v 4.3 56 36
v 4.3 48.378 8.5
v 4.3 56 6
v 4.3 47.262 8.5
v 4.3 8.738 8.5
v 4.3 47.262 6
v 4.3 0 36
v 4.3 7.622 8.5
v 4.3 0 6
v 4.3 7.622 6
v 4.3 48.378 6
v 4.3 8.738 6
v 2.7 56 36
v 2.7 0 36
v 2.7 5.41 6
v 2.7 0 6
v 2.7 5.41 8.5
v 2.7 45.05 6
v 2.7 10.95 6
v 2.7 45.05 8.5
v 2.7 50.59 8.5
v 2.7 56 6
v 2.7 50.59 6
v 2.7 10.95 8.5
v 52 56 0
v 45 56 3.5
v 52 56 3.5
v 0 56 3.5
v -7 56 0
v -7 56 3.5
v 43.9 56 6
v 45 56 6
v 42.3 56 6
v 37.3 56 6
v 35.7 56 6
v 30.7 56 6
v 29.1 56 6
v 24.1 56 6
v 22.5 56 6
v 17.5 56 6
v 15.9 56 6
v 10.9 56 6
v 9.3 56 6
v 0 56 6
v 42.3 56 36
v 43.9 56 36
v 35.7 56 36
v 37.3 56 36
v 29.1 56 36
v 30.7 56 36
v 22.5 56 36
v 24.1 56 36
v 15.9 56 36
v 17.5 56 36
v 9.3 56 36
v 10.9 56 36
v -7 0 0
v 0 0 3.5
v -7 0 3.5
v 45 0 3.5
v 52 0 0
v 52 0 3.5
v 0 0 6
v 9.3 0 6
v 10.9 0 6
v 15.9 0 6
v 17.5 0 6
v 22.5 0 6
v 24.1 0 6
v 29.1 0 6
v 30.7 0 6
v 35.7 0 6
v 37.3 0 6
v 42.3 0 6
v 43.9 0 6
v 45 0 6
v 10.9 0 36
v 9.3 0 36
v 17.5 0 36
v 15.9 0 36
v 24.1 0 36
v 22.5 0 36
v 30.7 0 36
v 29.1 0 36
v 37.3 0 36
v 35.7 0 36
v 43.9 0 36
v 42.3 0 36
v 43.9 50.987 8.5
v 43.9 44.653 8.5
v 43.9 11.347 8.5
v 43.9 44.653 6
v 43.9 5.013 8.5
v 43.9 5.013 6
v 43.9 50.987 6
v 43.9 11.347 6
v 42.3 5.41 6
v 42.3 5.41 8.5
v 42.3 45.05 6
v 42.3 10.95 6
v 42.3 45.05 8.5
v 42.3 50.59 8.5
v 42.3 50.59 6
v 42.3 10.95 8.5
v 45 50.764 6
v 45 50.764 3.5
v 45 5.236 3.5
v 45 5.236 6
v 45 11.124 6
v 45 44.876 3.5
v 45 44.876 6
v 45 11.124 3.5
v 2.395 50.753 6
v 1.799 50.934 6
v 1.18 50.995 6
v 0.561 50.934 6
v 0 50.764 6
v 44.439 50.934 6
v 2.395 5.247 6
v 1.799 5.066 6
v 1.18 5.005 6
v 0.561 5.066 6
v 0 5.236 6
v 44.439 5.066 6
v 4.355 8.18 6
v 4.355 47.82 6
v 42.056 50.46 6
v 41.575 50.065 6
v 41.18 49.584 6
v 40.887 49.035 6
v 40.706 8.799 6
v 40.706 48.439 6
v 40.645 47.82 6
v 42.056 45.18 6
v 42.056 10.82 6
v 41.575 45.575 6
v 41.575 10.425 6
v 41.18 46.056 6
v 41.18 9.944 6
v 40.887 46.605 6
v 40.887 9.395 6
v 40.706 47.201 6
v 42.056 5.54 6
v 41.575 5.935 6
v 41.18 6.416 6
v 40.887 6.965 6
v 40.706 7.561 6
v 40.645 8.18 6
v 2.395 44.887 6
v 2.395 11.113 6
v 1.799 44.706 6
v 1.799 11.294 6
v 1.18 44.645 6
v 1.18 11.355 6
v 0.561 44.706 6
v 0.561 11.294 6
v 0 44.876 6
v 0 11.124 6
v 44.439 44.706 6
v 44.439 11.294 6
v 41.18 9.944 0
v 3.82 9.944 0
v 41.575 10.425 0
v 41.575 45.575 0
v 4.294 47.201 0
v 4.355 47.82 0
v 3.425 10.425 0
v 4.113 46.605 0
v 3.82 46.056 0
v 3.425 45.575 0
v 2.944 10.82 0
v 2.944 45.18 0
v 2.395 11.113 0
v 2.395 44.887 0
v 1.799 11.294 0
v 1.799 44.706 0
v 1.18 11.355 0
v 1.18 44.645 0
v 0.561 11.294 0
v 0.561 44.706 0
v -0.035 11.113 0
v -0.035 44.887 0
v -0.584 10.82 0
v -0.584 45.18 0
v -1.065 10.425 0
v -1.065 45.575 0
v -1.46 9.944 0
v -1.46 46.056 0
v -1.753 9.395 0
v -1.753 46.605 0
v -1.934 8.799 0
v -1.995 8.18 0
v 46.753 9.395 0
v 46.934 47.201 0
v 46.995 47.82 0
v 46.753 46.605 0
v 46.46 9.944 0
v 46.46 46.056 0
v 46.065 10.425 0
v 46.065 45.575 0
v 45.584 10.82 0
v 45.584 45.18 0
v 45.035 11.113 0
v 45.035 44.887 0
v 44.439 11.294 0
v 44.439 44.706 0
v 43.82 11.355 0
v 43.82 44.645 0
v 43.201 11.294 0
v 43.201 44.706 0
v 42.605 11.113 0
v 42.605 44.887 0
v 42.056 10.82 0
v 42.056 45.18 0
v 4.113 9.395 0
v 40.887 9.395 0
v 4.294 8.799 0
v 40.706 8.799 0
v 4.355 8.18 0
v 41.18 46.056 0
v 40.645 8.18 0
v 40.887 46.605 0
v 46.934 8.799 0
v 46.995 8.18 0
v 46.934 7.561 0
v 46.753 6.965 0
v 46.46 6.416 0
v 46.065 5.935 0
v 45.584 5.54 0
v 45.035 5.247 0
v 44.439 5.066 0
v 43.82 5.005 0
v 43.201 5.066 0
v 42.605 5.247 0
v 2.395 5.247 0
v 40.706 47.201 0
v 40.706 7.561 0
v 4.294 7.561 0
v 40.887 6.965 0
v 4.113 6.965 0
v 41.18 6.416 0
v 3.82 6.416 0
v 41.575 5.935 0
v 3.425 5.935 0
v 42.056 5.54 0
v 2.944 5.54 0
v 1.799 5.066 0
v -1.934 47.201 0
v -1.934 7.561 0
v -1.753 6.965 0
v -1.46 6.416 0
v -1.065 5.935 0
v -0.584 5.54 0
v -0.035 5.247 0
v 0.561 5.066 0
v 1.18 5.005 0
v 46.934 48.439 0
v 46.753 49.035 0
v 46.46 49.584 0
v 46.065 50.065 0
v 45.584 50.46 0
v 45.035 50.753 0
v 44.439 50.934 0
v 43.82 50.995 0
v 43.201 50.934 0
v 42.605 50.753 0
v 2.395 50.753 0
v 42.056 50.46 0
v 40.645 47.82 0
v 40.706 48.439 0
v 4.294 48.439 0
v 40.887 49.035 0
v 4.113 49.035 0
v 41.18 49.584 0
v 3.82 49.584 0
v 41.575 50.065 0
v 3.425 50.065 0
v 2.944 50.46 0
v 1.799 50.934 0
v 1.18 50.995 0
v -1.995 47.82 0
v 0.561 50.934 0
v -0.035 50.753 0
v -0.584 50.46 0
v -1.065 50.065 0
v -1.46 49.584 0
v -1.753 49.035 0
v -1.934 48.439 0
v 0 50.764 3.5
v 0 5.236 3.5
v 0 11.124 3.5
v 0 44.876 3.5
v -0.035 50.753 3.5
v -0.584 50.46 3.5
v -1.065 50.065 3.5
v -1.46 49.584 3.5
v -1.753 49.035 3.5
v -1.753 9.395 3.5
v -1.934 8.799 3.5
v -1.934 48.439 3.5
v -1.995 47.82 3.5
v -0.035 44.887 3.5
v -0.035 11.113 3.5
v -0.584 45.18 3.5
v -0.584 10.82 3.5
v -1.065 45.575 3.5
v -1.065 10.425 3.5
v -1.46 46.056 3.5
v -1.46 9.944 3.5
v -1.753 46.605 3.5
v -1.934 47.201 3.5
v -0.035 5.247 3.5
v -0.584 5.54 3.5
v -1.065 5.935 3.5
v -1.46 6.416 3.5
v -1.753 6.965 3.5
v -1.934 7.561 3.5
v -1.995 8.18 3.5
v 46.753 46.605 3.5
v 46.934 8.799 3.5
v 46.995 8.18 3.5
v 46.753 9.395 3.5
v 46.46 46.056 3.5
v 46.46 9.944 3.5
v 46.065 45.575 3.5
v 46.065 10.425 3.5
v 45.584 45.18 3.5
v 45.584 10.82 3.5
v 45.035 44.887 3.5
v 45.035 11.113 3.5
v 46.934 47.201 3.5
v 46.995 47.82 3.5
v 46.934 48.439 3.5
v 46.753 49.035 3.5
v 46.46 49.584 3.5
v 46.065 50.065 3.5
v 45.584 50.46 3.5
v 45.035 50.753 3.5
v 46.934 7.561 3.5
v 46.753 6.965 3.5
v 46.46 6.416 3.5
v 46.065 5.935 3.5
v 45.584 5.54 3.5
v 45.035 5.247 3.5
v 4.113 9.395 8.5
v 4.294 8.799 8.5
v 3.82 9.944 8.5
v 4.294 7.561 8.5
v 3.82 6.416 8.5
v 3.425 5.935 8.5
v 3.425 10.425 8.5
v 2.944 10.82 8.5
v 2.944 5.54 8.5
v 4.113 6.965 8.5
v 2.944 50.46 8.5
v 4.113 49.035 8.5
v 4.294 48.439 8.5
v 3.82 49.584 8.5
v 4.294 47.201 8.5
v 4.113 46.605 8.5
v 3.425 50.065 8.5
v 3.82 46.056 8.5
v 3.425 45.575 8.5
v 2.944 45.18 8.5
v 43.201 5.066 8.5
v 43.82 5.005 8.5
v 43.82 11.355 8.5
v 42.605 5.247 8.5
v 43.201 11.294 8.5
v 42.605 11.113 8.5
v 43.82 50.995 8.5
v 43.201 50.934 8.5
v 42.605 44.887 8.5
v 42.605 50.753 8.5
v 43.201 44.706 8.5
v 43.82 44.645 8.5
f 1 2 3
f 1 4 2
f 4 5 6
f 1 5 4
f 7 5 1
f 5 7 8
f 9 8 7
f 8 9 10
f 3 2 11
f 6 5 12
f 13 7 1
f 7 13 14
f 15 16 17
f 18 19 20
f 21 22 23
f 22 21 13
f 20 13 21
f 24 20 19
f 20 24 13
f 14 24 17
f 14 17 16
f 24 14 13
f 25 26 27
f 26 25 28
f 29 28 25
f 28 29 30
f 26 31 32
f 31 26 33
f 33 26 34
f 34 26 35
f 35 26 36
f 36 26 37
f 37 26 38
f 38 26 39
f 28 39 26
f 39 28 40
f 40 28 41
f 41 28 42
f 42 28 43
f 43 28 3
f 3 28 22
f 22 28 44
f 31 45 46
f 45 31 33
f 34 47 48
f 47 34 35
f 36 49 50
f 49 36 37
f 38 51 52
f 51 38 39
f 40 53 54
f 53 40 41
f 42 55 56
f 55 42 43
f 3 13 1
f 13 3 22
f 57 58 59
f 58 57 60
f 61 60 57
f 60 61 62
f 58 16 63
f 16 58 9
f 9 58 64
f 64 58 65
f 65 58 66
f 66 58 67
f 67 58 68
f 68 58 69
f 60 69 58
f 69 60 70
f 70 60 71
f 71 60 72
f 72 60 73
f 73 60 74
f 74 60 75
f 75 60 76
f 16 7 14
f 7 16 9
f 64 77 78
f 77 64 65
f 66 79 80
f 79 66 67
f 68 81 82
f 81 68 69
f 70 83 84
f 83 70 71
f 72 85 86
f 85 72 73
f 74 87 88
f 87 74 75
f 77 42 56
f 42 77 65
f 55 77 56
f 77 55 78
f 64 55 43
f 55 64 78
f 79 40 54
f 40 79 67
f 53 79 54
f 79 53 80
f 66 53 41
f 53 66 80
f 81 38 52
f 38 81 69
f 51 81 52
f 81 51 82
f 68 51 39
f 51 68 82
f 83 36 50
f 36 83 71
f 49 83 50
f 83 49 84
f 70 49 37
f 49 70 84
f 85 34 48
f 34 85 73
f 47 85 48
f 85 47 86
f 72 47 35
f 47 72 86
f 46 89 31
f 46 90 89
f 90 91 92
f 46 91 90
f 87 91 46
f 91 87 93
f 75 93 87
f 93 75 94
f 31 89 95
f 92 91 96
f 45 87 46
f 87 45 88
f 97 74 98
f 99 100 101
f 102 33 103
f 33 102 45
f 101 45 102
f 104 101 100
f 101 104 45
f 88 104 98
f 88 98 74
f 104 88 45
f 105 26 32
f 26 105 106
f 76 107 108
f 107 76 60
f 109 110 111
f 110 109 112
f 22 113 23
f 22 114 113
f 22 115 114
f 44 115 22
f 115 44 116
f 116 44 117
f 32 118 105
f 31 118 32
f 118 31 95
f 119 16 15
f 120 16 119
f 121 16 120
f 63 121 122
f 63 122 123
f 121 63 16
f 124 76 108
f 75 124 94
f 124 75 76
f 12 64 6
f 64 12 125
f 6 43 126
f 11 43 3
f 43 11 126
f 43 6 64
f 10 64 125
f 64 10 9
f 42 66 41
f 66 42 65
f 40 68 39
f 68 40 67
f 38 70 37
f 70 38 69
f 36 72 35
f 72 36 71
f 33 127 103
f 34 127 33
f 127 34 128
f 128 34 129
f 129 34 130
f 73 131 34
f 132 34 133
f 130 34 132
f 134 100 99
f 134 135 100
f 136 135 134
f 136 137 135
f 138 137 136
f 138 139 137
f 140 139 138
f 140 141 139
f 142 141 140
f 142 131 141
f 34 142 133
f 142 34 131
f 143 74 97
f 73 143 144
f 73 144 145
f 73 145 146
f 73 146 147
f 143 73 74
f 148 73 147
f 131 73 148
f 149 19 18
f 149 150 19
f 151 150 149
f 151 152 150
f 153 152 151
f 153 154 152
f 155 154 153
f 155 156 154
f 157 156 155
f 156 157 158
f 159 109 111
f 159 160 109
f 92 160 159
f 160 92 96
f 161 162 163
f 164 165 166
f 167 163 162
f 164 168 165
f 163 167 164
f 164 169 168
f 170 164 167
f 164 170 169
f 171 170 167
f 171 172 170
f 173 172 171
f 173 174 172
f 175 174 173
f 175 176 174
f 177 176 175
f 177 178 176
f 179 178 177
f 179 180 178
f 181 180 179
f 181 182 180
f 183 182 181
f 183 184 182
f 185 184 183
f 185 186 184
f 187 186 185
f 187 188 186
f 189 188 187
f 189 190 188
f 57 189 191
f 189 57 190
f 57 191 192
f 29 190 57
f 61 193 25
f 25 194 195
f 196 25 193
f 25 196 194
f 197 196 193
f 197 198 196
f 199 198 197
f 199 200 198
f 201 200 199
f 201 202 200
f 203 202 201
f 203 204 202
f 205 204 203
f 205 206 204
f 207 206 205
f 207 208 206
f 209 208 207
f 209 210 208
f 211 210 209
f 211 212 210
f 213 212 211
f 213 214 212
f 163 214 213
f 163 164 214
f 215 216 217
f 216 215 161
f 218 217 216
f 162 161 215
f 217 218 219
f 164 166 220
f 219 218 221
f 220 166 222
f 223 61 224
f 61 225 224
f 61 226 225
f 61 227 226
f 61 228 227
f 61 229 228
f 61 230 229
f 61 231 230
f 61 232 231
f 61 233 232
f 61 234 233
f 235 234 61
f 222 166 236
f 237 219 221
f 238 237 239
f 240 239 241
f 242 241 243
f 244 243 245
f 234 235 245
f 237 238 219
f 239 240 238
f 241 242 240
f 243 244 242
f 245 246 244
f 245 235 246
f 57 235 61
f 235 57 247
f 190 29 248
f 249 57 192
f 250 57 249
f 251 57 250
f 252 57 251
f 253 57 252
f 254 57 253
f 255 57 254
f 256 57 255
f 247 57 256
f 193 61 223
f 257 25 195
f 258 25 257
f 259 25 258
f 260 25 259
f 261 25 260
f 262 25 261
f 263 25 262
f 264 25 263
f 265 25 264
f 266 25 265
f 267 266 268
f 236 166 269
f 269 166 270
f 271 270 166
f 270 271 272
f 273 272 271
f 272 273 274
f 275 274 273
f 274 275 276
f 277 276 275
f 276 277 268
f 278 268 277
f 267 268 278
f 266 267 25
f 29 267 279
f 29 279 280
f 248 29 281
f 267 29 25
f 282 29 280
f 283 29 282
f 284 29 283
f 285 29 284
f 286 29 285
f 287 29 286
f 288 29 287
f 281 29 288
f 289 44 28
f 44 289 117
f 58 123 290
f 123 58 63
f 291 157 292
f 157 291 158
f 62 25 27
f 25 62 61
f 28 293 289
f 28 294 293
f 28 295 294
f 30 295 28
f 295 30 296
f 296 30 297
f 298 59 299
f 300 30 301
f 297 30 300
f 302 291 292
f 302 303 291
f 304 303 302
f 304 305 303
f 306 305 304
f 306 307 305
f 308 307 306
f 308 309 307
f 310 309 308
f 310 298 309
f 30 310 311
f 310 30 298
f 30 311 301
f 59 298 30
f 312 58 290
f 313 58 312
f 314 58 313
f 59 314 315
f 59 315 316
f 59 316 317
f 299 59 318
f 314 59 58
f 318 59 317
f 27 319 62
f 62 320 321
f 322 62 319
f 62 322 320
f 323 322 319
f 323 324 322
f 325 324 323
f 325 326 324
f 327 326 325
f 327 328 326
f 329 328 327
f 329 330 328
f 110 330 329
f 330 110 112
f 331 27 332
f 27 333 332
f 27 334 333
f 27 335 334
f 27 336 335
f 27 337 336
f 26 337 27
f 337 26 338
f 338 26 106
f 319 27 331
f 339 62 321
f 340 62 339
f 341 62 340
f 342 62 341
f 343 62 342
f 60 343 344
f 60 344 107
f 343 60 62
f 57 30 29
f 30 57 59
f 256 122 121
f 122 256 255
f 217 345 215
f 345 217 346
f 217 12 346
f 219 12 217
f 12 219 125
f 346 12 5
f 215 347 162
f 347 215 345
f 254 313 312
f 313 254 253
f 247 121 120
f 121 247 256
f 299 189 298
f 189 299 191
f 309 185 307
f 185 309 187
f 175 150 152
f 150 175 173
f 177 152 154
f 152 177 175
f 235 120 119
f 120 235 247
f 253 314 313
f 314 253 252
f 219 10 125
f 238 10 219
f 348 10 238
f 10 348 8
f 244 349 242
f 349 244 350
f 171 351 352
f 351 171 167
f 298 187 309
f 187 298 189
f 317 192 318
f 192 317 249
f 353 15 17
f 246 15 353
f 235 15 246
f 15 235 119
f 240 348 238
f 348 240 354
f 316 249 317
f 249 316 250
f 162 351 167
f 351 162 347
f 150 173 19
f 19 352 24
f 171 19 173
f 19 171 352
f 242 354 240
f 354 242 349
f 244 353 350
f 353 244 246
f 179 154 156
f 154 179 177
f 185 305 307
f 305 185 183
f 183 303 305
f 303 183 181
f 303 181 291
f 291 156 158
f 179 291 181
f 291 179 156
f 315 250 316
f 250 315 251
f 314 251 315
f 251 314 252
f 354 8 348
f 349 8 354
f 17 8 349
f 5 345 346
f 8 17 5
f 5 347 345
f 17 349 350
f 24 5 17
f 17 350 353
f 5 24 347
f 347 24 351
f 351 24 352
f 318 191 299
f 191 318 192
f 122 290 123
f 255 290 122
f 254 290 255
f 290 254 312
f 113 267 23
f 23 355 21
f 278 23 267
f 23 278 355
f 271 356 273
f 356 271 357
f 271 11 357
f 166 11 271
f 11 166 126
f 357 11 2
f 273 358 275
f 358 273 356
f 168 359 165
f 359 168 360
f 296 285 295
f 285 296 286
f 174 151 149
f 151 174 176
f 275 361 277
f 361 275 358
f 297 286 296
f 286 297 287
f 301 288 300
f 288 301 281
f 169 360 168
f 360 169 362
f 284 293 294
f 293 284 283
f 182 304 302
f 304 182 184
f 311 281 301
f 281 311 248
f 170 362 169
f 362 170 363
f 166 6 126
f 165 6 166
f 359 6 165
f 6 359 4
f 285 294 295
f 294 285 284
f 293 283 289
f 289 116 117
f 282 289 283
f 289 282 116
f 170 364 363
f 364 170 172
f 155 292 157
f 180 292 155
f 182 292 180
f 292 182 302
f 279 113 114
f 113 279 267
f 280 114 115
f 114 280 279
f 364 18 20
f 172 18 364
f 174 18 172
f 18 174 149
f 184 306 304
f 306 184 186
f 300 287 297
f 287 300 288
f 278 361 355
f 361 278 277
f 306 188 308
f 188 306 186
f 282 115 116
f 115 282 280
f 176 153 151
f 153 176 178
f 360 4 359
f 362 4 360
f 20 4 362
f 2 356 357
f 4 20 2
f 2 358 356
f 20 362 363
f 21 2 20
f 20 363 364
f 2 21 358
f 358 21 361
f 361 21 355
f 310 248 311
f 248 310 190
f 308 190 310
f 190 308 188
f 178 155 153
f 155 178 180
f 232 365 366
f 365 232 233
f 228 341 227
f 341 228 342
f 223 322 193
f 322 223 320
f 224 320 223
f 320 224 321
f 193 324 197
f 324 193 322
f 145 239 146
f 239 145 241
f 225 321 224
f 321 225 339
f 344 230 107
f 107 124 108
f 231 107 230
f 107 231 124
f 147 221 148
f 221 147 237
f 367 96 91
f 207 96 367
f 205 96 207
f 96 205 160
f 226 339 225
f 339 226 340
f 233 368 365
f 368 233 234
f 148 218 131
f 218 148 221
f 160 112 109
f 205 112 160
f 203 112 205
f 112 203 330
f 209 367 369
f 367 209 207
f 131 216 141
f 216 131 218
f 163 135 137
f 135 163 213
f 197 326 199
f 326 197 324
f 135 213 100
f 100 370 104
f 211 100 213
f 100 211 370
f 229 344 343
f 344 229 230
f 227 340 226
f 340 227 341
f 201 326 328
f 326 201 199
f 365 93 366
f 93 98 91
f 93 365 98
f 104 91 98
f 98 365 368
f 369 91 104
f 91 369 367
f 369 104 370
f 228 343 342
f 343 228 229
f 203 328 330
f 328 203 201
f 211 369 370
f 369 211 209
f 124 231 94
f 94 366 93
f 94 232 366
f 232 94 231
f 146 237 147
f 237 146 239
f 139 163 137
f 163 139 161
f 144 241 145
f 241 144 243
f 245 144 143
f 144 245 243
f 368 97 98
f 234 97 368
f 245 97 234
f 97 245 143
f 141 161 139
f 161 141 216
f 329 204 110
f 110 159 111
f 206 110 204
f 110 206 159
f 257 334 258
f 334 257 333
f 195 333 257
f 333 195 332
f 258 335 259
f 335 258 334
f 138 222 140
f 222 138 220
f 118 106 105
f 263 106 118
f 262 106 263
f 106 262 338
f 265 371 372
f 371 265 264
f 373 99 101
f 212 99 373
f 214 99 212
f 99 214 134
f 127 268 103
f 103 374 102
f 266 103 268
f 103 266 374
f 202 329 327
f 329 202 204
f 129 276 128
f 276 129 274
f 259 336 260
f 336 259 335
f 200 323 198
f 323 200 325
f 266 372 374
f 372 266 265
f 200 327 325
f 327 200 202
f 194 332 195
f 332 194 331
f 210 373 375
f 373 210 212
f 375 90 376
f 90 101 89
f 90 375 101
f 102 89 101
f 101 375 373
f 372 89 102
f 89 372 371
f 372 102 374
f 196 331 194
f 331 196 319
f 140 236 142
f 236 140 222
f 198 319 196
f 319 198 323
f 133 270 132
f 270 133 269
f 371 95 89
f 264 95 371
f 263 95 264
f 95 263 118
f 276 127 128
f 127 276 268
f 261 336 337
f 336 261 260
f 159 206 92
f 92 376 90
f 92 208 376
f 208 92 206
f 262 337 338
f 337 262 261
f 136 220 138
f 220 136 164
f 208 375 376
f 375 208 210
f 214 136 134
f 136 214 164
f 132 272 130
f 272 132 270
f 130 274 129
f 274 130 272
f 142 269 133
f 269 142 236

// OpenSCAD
$fn = 32;

// ----------------------------------------------------------------------
// Finned heat sink: 45 x 56 mm base, 30 mm fins
// ----------------------------------------------------------------------

// --- parameters (mm) ---
base_w = 45;              // base width
base_d = 56;              // base depth
base_t = 6;               // base thickness
fin_h = 30;               // fin height above the base
holes_d = 6.35;           // fixing holes
hole_x = 21.32;           // hole offset in x
hole_y = 19.82;           // hole offset in y
fin_t = 1.6;              // fin thickness
fin_pitch = 6.6;          // fin pitch
fin_count = 7;            // number of fins
fin_x0 = 2.7;             // first fin offset
flange_w = 59;            // flange plate width
flange_t = 3;             // flange plate thickness

difference() {
  union() {
    cube([base_w, base_d, base_t]);
    for (i = [0 : fin_count - 1]) {
      translate([fin_x0 + i * fin_pitch, 0, base_t - 0.5]) cube([fin_t, base_d, fin_h + 0.5]);
    }
    /* mounting flange, a wider plate sharing the base bottom */
    translate([(base_w - flange_w) / 2, 0, 0]) cube([flange_w, base_d, flange_t + 0.5]);
  }
  /* fixing holes through the base, 2.5 mm clear on both sides */
  for (hx = [-21.32, 21.32]) {
    for (hy = [-19.82, 19.82]) {
      translate([base_w / 2 + hx, base_d / 2 + hy, -2.5]) cylinder(h = base_t + 5, d = holes_d);
    }
  }
}
